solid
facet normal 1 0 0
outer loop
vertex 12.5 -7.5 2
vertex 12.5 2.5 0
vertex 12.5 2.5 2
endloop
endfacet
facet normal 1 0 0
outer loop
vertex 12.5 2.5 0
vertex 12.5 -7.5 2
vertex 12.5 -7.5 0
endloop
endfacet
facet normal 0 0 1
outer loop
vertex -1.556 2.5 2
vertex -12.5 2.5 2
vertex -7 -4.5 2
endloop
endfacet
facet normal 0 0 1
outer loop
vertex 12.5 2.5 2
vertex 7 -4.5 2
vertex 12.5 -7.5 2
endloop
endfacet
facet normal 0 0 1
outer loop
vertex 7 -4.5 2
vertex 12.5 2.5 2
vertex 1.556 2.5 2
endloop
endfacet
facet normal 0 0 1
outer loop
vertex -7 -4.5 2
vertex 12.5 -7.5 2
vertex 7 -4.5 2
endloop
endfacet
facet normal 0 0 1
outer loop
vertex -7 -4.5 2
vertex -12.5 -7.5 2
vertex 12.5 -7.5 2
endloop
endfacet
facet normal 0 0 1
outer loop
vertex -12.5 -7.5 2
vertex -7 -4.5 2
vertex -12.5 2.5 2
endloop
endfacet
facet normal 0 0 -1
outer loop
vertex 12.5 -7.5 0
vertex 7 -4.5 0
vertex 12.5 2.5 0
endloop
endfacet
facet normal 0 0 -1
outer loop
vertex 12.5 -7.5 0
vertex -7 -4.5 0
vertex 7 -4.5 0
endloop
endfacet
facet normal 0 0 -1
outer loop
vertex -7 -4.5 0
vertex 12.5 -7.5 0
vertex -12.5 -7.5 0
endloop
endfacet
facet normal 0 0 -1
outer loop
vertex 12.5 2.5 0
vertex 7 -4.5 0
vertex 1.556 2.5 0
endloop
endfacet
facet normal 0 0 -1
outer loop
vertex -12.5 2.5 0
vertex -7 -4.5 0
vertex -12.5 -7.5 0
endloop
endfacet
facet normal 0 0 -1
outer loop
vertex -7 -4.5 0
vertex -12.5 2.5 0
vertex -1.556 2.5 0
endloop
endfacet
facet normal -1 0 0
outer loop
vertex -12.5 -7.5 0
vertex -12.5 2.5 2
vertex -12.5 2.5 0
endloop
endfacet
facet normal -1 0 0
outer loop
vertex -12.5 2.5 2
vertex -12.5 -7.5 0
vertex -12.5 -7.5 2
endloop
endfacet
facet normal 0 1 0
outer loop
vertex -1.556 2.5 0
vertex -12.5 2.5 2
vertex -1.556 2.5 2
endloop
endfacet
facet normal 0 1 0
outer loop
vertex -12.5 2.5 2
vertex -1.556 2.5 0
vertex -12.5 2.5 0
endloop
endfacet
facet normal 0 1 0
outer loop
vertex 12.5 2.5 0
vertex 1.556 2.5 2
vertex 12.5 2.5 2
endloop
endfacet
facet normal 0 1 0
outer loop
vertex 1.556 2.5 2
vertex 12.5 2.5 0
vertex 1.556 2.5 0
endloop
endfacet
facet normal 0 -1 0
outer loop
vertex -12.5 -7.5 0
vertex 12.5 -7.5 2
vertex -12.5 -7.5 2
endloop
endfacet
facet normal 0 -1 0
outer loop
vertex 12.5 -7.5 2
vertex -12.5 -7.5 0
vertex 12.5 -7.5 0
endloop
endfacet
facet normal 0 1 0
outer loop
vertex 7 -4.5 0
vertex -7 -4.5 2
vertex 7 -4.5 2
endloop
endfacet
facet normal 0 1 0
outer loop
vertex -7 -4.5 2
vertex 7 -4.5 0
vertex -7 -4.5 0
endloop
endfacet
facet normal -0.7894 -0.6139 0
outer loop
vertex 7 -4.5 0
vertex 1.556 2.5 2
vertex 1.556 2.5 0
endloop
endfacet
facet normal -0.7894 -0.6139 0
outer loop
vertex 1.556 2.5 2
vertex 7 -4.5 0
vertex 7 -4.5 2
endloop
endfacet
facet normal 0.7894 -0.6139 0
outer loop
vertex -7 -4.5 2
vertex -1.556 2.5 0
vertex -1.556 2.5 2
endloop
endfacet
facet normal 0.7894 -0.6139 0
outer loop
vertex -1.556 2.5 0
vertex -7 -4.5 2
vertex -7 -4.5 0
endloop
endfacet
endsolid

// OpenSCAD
difference() {
	union() {
		translate(v = [0, 0, 1.0000000000]) {
			cube(center = true, size = [25, 5, 2]);
		}
		translate(v = [0, -5, 0]) {
			translate(v = [0, 0, 1.0000000000]) {
				cube(center = true, size = [25, 5, 2]);
			}
		}
	}
	translate(v = [0, -4.5000000000, 0]) {
		translate(v = [-7.0000000000, 0, 0]) {
			linear_extrude(height = 2) {
				polygon(points = [[0, 0], [14, 0], [7.0000000000, 9]]);
			}
		}
	}
}
